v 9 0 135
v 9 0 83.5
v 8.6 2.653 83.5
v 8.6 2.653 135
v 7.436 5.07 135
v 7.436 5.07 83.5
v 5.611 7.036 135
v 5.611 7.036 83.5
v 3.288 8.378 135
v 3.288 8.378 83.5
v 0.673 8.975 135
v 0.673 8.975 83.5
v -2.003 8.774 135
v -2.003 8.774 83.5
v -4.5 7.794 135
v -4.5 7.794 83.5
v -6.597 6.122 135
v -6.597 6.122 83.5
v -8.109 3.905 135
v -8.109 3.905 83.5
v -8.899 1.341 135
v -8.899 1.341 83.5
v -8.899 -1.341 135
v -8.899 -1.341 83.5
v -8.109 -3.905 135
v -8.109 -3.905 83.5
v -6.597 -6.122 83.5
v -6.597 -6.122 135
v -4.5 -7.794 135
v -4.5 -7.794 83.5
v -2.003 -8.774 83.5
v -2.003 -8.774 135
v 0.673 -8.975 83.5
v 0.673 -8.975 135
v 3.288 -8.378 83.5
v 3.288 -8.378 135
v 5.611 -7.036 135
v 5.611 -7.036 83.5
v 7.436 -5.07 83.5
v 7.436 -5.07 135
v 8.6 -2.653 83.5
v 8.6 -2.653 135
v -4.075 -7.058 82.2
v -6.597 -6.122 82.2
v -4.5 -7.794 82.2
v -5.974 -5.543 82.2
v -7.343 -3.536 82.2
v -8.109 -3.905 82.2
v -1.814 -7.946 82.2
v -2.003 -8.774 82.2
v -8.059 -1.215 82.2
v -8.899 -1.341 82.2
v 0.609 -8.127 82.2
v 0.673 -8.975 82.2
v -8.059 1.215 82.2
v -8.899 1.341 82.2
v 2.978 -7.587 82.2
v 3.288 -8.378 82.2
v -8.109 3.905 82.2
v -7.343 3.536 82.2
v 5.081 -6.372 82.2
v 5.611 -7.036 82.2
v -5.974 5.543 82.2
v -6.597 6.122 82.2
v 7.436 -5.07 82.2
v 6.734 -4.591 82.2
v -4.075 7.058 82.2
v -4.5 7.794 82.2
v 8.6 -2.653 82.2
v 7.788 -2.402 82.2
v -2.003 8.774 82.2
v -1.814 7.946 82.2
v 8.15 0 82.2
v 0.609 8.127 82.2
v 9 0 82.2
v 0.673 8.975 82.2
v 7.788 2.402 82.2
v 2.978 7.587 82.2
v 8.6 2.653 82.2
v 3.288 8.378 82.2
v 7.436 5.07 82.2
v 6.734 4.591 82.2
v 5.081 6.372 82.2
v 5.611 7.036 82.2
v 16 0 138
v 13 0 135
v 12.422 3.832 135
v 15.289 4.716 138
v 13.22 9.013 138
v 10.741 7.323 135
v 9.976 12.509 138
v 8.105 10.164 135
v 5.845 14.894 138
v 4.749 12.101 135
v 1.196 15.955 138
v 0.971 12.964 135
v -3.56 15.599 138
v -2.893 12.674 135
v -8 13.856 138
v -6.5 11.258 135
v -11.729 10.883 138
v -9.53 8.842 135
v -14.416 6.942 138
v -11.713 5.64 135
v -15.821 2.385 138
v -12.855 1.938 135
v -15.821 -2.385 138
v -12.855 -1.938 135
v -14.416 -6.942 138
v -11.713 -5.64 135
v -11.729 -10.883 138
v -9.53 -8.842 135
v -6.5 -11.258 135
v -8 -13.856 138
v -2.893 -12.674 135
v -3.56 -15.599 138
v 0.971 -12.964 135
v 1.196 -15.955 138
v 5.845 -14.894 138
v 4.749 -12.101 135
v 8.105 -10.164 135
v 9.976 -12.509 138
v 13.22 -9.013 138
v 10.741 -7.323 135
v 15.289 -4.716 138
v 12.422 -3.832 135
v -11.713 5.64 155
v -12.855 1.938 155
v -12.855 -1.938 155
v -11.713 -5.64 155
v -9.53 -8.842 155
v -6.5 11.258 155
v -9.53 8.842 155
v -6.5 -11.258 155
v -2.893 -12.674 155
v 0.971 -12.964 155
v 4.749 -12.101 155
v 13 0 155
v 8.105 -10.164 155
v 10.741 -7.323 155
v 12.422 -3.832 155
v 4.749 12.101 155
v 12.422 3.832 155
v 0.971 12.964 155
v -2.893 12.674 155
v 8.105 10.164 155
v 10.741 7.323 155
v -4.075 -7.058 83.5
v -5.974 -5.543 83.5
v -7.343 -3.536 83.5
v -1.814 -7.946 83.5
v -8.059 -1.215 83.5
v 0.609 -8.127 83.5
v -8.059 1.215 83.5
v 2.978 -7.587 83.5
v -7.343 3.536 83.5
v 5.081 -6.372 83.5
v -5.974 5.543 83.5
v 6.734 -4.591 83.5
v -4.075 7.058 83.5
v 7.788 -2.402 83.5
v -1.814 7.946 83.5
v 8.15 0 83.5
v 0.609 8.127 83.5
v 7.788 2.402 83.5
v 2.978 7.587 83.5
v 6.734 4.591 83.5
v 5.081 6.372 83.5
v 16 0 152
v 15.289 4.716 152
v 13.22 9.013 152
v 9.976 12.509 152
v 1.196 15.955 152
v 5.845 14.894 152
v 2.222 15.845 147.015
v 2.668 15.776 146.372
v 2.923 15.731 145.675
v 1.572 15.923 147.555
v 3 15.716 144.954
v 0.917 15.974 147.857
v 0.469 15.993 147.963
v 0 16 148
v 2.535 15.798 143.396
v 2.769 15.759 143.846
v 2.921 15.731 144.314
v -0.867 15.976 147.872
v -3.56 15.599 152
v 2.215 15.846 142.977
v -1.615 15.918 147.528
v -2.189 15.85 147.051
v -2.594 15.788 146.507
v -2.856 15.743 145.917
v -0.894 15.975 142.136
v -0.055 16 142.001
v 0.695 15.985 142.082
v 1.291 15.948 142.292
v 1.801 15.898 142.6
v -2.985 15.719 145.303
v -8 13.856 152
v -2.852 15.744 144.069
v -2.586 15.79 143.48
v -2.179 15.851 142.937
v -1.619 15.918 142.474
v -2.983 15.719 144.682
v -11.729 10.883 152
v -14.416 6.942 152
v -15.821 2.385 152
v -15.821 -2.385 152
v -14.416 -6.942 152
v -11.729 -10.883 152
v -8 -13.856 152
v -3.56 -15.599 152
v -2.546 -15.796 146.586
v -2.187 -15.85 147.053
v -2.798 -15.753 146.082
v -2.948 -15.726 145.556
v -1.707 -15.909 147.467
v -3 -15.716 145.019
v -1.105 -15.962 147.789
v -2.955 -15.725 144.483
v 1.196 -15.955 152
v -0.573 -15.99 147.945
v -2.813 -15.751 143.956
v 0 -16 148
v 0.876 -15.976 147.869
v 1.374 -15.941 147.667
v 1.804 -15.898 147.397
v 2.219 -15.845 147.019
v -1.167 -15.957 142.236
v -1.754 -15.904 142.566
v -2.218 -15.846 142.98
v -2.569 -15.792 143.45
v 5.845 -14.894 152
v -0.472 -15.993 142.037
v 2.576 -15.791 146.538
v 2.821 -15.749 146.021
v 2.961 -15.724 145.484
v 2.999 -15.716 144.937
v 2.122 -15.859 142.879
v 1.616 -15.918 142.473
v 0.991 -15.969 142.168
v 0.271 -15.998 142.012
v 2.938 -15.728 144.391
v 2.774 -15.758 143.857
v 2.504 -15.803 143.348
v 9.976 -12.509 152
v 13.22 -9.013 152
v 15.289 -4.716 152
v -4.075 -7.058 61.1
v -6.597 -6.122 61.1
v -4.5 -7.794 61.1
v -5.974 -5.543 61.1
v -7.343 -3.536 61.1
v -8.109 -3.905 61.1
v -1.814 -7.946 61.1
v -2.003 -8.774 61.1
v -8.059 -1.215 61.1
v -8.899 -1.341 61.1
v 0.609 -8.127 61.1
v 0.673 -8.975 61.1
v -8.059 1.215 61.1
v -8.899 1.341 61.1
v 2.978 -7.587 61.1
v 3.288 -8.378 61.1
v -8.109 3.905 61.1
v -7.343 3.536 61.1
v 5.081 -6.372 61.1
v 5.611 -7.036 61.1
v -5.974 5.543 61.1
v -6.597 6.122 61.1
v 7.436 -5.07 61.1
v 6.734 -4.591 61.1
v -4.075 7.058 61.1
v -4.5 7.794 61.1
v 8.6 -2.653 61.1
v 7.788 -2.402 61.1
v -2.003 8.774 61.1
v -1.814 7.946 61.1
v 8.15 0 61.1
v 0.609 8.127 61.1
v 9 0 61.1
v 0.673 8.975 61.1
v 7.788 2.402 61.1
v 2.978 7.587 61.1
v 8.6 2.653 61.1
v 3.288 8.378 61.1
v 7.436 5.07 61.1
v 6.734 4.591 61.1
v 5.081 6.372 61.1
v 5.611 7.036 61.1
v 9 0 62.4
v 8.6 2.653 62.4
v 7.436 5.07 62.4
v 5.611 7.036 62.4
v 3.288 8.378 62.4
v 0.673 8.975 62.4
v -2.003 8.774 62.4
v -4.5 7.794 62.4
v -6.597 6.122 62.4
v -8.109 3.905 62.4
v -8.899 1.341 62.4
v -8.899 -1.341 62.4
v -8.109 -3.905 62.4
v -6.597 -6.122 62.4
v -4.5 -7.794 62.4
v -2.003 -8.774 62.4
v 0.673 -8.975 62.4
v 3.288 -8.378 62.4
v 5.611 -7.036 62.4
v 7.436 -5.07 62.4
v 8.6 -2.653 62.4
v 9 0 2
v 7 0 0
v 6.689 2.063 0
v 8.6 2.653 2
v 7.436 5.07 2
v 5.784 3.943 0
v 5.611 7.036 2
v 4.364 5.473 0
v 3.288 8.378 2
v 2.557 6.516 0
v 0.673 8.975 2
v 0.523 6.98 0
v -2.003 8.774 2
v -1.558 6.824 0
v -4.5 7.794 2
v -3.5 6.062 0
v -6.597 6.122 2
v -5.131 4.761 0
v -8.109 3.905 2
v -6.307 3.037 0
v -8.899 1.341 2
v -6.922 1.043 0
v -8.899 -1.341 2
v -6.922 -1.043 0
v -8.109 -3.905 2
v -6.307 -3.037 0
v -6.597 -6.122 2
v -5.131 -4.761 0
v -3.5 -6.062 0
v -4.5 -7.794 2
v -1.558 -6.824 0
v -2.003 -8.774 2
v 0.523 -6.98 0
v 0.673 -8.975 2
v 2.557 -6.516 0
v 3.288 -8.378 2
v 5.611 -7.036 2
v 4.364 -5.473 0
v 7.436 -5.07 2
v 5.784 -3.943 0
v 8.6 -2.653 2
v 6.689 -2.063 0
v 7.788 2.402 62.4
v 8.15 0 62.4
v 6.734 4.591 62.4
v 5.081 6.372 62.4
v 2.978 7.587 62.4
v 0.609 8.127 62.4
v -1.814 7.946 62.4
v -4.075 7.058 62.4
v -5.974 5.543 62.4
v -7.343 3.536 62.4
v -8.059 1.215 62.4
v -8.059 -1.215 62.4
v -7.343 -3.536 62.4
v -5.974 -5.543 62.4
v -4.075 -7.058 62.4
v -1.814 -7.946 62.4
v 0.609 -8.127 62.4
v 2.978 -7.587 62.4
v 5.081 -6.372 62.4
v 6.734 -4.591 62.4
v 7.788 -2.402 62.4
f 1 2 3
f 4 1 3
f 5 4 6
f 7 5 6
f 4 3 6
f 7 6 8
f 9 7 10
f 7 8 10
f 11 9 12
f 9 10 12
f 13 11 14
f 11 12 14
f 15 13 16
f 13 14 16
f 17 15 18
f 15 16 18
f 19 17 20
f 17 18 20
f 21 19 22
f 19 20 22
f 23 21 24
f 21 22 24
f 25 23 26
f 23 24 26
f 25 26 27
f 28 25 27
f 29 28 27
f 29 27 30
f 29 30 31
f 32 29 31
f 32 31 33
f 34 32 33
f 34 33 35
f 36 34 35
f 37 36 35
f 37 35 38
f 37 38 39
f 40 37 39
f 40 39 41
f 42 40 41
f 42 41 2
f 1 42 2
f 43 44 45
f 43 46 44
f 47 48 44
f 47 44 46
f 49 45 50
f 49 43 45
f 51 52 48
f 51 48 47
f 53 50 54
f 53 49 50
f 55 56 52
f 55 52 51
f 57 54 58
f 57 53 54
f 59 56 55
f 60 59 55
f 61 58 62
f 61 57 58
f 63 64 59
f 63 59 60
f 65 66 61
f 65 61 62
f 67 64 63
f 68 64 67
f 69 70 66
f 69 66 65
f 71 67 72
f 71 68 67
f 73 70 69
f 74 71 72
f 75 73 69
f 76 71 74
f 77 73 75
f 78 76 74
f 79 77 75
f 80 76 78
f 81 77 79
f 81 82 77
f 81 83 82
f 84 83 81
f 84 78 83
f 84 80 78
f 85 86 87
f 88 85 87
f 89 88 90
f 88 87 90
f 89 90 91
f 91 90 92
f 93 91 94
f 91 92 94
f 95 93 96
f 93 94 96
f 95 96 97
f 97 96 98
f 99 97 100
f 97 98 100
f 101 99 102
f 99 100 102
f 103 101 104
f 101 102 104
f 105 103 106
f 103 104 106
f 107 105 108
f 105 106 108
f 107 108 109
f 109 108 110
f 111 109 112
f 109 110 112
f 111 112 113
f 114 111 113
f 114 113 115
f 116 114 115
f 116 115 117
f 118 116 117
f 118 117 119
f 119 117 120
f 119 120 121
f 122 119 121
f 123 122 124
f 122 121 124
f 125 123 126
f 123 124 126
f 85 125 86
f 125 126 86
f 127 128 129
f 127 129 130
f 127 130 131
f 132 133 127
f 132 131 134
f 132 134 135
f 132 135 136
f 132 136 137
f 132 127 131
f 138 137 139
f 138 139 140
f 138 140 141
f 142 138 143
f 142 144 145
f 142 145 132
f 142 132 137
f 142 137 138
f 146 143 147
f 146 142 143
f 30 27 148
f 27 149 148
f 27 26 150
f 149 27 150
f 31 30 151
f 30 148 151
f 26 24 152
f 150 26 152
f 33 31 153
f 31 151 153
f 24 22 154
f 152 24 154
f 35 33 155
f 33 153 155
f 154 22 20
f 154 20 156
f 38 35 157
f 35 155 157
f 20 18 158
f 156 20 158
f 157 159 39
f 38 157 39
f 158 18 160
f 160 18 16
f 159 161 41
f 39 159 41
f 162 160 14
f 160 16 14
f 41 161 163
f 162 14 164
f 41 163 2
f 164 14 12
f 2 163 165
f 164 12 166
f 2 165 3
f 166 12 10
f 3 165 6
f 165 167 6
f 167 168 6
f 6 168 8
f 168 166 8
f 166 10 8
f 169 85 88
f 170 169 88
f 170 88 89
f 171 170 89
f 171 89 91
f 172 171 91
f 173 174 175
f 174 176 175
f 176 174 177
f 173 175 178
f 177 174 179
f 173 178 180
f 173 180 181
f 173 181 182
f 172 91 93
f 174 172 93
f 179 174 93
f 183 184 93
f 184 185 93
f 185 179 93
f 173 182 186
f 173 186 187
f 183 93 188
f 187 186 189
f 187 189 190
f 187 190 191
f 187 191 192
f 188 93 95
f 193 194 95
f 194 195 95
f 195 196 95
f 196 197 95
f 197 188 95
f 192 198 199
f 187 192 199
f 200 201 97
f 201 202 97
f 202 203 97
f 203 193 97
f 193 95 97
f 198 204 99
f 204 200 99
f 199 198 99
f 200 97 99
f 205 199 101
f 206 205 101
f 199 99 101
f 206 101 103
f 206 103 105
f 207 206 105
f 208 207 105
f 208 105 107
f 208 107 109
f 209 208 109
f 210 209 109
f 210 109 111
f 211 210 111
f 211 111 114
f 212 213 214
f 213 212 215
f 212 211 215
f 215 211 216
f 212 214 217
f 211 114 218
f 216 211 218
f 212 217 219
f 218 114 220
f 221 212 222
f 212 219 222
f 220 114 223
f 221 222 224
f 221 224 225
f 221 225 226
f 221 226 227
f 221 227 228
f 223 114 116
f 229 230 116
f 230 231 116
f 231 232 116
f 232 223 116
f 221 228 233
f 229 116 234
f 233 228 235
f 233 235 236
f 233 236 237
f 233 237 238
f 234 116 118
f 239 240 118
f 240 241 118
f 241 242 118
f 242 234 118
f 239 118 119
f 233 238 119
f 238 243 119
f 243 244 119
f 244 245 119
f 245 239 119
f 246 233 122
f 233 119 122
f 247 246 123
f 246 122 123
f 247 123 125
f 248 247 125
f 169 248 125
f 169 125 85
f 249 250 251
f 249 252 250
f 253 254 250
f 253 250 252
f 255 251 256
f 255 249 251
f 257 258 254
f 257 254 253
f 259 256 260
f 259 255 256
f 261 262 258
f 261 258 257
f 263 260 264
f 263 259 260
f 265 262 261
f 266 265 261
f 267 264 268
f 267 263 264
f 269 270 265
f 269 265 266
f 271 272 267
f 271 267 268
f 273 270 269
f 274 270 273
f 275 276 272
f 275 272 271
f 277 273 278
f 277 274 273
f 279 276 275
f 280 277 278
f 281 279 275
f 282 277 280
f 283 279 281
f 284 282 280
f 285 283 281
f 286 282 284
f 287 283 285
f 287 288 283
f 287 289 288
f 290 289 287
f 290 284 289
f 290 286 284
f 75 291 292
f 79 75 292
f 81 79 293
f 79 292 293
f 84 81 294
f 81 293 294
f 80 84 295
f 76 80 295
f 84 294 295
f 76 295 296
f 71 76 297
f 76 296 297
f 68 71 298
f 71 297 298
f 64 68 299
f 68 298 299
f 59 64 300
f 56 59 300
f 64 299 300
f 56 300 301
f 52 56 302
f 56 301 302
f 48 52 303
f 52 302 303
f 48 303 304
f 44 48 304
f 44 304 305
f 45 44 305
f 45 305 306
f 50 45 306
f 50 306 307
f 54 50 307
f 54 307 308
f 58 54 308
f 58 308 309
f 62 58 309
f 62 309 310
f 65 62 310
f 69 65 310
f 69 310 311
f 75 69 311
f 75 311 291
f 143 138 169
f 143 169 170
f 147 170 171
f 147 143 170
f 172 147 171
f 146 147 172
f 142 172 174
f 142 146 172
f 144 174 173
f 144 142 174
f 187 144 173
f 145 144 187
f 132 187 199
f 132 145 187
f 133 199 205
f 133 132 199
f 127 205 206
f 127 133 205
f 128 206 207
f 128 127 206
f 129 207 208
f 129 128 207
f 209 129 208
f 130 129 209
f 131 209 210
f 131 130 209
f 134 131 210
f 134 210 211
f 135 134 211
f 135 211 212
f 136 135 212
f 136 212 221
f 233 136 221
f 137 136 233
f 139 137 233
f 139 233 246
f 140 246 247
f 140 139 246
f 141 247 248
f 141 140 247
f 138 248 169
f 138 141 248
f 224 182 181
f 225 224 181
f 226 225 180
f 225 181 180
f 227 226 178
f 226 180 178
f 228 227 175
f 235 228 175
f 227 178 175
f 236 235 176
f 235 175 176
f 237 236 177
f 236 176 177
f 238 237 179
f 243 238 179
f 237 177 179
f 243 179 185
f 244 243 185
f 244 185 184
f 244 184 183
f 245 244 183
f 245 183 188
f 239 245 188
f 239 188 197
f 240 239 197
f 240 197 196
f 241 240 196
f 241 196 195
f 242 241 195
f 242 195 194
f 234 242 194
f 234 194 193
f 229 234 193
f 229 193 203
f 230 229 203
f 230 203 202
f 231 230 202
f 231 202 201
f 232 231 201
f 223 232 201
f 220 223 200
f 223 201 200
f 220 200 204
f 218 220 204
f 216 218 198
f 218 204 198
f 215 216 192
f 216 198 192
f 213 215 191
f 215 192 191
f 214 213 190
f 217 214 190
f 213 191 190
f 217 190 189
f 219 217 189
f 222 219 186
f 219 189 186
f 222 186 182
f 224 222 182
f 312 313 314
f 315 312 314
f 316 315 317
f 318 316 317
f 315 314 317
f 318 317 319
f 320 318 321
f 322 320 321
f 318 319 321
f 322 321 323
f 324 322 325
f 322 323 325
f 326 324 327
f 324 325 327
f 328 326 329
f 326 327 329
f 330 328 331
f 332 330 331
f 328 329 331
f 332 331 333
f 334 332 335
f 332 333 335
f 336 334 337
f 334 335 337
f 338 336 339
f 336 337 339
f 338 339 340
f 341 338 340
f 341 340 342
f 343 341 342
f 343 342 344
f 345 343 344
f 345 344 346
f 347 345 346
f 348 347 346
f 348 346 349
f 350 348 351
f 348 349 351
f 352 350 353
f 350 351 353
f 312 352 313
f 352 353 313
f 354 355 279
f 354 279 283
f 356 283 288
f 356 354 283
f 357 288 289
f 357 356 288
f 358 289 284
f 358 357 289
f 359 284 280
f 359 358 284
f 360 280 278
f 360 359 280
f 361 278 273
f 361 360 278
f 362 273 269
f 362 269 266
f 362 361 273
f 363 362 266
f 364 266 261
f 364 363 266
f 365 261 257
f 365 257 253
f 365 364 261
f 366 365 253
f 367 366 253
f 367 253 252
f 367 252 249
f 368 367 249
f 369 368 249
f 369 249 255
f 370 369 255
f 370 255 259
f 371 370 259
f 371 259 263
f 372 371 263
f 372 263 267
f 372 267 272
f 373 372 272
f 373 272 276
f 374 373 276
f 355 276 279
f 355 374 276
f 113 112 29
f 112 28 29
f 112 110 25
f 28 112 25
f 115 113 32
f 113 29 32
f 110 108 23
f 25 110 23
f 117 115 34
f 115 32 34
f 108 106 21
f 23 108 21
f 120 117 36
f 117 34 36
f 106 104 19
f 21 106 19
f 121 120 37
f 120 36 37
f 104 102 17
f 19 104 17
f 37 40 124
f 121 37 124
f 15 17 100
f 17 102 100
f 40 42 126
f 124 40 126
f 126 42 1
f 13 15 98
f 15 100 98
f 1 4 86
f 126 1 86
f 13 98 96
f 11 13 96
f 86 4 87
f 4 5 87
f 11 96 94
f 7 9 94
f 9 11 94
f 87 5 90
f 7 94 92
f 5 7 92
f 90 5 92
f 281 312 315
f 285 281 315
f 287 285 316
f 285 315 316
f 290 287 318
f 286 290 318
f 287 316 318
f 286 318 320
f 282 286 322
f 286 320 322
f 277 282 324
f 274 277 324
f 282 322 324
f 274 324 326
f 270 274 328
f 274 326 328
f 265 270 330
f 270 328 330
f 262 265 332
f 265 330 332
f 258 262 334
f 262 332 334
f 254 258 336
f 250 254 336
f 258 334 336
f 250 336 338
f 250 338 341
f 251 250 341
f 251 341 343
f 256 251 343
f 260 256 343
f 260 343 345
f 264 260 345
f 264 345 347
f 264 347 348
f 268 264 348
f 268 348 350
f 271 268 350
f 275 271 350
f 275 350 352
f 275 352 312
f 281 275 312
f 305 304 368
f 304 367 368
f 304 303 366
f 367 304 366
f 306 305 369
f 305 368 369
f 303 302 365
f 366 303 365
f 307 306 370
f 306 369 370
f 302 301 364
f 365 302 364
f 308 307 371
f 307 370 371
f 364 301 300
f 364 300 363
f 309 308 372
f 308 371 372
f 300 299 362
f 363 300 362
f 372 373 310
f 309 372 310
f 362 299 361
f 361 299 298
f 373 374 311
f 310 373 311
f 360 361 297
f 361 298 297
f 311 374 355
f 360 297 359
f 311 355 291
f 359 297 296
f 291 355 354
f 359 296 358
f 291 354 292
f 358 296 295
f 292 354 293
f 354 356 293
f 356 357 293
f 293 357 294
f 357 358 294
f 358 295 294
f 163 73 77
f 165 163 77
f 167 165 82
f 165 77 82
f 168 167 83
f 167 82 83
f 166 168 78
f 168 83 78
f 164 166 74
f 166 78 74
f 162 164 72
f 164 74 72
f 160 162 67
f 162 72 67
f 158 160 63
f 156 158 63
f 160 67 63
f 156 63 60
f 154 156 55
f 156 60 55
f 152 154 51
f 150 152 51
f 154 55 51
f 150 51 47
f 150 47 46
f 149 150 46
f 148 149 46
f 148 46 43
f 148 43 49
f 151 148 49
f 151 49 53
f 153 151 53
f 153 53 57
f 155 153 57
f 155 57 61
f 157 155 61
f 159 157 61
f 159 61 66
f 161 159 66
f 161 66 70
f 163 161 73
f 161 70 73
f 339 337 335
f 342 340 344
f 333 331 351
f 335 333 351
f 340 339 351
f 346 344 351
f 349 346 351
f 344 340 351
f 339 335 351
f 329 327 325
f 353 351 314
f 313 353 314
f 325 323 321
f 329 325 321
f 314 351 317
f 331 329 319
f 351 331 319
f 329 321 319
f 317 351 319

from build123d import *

# Parameters (mm, degrees)
SCHIZZO2_R                   = 9
ESTRUSIONE_ESTRUSIONE1_DEPTH = 135
SCHIZZO3_R                   = 16
ESTRUSIONE_ESTRUSIONE2_DEPTH = 20
TAGLIO_ESTRUSIONE1_REACH     = 161.075
SCHIZZO4_R                   = 3
SMUSSO1_SIZE                 = 3
SMUSSO2_SIZE                 = 2
TAGLIO_ESTRUSIONE2_START     = -1.3
SCHIZZO6_R                   = 9
SCHIZZO6_R_2                 = 8.15
TAGLIO_ESTRUSIONE2_DEPTH     = 1.3


with BuildPart() as part:
    # Schizzo2 → Estrusione-Estrusione1 (new body)
    with BuildSketch(Plane.XY):
        Circle(SCHIZZO2_R)
    extrude(amount=ESTRUSIONE_ESTRUSIONE1_DEPTH)

    # Schizzo3 → Estrusione-Estrusione2 (add)
    with BuildSketch(Plane.XY.offset(135)):
        Circle(SCHIZZO3_R)
    extrude(amount=ESTRUSIONE_ESTRUSIONE2_DEPTH)

    # Schizzo4 → Taglio-Estrusione1 (cut, up to next)
    with BuildSketch(Plane(origin=(0, 16, 0), x_dir=(1, 0, 0), z_dir=(0, 1, 0)), mode=Mode.PRIVATE) as taglio_estrusione1_sk1:
        with Locations(Location((0, -145, 0), (0, 0, 270))):
            Circle(SCHIZZO4_R)
    taglio_estrusione1_tool1 = extrude(taglio_estrusione1_sk1.sketch, amount=-TAGLIO_ESTRUSIONE1_REACH, mode=Mode.PRIVATE) & part.part
    add(taglio_estrusione1_tool1.solids().sort_by_distance((0, 16, 145))[0], mode=Mode.SUBTRACT)

    # Smusso1
    smusso1_edges = [part.edges().sort_by_distance(p)[0] for p in [
        (-16, 0, 135),
        (-16, 0, 155),
    ]]
    chamfer(smusso1_edges, length=SMUSSO1_SIZE)

    # Smusso2
    smusso2_edges = [part.edges().sort_by_distance(p)[0] for p in [
        (-9, 0, 0),
    ]]
    chamfer(smusso2_edges, length=SMUSSO2_SIZE)

    # Schizzo6 → Taglio-Estrusione2 (cut)
    with BuildSketch(Plane.XY.offset(83.5).offset(TAGLIO_ESTRUSIONE2_START)):
        Circle(SCHIZZO6_R)
        Circle(SCHIZZO6_R_2, mode=Mode.SUBTRACT)
    taglio_estrusione2 = extrude(amount=TAGLIO_ESTRUSIONE2_DEPTH, mode=Mode.SUBTRACT)

    # Specchia1: Taglio-Estrusione2 across plane
    add(taglio_estrusione2.mirror(Plane(origin=(0, 0, 72.3), x_dir=(1, 0, 0), z_dir=(0, 0, -1))), mode=Mode.SUBTRACT)


solid = part.part
